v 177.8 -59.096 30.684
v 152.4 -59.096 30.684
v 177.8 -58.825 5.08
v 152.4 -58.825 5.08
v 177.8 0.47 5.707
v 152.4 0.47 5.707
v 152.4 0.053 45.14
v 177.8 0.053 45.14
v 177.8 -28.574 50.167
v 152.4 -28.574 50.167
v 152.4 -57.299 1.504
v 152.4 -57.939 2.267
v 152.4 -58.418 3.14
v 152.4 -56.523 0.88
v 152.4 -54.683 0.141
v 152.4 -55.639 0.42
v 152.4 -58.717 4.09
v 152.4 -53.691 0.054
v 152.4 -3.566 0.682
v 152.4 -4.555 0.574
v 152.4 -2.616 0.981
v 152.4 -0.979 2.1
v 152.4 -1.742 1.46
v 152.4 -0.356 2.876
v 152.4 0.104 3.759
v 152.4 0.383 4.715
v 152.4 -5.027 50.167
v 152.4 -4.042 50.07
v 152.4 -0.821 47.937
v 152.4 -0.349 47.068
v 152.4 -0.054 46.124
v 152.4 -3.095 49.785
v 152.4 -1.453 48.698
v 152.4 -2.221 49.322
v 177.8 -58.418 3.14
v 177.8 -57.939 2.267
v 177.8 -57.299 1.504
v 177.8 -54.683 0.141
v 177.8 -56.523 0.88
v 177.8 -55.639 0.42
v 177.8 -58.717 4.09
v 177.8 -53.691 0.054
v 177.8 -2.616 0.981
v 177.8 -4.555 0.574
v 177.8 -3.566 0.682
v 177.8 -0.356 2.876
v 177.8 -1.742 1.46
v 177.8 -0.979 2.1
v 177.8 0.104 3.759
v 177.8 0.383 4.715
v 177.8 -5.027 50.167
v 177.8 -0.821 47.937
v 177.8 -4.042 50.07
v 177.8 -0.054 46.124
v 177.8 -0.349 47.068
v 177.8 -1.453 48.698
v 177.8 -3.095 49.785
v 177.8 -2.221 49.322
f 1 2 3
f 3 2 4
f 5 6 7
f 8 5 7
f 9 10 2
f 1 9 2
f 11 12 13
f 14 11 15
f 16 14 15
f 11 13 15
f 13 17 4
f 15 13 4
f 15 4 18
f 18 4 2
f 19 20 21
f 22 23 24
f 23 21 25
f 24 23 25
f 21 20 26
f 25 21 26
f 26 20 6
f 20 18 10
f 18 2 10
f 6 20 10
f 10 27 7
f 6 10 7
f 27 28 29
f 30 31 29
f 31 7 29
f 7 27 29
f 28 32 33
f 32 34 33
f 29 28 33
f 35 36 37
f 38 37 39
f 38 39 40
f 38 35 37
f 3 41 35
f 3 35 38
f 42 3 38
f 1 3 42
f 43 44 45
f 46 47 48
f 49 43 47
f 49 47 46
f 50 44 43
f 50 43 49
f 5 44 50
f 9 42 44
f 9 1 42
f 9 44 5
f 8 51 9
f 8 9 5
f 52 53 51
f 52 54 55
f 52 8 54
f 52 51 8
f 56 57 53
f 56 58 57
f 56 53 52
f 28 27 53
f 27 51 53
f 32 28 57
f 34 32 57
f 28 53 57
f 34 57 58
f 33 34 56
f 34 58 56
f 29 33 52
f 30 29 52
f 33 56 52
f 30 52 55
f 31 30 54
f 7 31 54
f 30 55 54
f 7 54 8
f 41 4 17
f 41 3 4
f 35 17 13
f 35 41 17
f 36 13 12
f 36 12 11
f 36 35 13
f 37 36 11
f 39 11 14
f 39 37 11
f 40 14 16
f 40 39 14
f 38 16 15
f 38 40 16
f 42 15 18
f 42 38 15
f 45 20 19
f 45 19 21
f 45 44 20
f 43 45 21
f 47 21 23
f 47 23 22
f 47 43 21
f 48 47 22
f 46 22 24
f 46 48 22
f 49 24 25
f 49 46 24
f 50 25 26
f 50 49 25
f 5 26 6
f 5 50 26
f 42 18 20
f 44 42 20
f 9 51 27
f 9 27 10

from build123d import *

# Parameters (mm, degrees)
F2_DEPTH = 25.4
F3_R     = 5.08
F4_R     = 5.08


with BuildPart() as f2:
    # F1 (on offset) → F2 (new body)
    with BuildSketch(Plane.YZ.offset(152.4)):
        Polygon((-28.573824, 50.16654), (-59.09586, 30.684389), (-58.771159, 0), (0.524219, 0.627459), (0, 50.16654), align=None)
    extrude(amount=F2_DEPTH)

    # F3
    f3_edges = [f2.edges().sort_by_distance(p)[0] for p in [
        (165.1, -58.771159, 0),
    ]]
    fillet(f3_edges, radius=F3_R)

    # F4
    f4_edges = [f2.edges().sort_by_distance(p)[0] for p in [
        (165.1, 0.524219, 0.627459),
        (165.1, 0, 50.16654),
    ]]
    fillet(f4_edges, radius=F4_R)


solid = f2.part
